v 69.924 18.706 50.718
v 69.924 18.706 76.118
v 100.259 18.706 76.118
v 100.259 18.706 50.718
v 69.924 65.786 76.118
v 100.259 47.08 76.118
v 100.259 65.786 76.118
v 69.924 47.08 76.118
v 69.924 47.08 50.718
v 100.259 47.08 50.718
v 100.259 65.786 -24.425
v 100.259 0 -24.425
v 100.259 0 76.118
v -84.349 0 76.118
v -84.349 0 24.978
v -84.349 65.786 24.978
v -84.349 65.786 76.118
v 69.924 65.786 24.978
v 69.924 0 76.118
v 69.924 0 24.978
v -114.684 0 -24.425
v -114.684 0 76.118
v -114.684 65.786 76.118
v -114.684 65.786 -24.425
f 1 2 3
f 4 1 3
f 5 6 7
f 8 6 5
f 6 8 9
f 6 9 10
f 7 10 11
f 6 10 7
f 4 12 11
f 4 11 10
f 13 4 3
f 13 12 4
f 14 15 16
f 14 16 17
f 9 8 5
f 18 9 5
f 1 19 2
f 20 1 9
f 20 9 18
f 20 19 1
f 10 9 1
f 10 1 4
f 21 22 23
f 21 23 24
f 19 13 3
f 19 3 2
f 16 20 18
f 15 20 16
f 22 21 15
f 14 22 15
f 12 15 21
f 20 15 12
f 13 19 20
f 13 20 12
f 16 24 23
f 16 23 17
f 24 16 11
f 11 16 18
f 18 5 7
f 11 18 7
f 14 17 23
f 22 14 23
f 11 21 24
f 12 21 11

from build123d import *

# Parameters (mm, degrees)
F1_DEPTH = 65.786
F2_W     = 30.334652
F2_H     = 28.374772
F3_DEPTH = 25.4


with BuildPart() as f1:
    # F0 (on Front) → F1 (new body)
    with BuildSketch(Plane.XZ):
        Polygon((-84.349416, 76.117642), (-114.684075, 76.117642), (-114.684075, -24.425024), (100.258619, -24.425024), (100.258619, 76.117642), (69.923967, 76.117642), (69.923967, 24.977572), (-7.212728, 24.977572), (-84.349416, 24.977572), align=None)
    extrude(amount=-F1_DEPTH)

    # F2 (on face) → F3 (cut)
    with BuildSketch(Plane.XY.offset(76.117642)):
        with Locations((85.091293, 32.893)):
            Rectangle(F2_W, F2_H)
    extrude(amount=-F3_DEPTH, mode=Mode.SUBTRACT)


solid = f1.part
